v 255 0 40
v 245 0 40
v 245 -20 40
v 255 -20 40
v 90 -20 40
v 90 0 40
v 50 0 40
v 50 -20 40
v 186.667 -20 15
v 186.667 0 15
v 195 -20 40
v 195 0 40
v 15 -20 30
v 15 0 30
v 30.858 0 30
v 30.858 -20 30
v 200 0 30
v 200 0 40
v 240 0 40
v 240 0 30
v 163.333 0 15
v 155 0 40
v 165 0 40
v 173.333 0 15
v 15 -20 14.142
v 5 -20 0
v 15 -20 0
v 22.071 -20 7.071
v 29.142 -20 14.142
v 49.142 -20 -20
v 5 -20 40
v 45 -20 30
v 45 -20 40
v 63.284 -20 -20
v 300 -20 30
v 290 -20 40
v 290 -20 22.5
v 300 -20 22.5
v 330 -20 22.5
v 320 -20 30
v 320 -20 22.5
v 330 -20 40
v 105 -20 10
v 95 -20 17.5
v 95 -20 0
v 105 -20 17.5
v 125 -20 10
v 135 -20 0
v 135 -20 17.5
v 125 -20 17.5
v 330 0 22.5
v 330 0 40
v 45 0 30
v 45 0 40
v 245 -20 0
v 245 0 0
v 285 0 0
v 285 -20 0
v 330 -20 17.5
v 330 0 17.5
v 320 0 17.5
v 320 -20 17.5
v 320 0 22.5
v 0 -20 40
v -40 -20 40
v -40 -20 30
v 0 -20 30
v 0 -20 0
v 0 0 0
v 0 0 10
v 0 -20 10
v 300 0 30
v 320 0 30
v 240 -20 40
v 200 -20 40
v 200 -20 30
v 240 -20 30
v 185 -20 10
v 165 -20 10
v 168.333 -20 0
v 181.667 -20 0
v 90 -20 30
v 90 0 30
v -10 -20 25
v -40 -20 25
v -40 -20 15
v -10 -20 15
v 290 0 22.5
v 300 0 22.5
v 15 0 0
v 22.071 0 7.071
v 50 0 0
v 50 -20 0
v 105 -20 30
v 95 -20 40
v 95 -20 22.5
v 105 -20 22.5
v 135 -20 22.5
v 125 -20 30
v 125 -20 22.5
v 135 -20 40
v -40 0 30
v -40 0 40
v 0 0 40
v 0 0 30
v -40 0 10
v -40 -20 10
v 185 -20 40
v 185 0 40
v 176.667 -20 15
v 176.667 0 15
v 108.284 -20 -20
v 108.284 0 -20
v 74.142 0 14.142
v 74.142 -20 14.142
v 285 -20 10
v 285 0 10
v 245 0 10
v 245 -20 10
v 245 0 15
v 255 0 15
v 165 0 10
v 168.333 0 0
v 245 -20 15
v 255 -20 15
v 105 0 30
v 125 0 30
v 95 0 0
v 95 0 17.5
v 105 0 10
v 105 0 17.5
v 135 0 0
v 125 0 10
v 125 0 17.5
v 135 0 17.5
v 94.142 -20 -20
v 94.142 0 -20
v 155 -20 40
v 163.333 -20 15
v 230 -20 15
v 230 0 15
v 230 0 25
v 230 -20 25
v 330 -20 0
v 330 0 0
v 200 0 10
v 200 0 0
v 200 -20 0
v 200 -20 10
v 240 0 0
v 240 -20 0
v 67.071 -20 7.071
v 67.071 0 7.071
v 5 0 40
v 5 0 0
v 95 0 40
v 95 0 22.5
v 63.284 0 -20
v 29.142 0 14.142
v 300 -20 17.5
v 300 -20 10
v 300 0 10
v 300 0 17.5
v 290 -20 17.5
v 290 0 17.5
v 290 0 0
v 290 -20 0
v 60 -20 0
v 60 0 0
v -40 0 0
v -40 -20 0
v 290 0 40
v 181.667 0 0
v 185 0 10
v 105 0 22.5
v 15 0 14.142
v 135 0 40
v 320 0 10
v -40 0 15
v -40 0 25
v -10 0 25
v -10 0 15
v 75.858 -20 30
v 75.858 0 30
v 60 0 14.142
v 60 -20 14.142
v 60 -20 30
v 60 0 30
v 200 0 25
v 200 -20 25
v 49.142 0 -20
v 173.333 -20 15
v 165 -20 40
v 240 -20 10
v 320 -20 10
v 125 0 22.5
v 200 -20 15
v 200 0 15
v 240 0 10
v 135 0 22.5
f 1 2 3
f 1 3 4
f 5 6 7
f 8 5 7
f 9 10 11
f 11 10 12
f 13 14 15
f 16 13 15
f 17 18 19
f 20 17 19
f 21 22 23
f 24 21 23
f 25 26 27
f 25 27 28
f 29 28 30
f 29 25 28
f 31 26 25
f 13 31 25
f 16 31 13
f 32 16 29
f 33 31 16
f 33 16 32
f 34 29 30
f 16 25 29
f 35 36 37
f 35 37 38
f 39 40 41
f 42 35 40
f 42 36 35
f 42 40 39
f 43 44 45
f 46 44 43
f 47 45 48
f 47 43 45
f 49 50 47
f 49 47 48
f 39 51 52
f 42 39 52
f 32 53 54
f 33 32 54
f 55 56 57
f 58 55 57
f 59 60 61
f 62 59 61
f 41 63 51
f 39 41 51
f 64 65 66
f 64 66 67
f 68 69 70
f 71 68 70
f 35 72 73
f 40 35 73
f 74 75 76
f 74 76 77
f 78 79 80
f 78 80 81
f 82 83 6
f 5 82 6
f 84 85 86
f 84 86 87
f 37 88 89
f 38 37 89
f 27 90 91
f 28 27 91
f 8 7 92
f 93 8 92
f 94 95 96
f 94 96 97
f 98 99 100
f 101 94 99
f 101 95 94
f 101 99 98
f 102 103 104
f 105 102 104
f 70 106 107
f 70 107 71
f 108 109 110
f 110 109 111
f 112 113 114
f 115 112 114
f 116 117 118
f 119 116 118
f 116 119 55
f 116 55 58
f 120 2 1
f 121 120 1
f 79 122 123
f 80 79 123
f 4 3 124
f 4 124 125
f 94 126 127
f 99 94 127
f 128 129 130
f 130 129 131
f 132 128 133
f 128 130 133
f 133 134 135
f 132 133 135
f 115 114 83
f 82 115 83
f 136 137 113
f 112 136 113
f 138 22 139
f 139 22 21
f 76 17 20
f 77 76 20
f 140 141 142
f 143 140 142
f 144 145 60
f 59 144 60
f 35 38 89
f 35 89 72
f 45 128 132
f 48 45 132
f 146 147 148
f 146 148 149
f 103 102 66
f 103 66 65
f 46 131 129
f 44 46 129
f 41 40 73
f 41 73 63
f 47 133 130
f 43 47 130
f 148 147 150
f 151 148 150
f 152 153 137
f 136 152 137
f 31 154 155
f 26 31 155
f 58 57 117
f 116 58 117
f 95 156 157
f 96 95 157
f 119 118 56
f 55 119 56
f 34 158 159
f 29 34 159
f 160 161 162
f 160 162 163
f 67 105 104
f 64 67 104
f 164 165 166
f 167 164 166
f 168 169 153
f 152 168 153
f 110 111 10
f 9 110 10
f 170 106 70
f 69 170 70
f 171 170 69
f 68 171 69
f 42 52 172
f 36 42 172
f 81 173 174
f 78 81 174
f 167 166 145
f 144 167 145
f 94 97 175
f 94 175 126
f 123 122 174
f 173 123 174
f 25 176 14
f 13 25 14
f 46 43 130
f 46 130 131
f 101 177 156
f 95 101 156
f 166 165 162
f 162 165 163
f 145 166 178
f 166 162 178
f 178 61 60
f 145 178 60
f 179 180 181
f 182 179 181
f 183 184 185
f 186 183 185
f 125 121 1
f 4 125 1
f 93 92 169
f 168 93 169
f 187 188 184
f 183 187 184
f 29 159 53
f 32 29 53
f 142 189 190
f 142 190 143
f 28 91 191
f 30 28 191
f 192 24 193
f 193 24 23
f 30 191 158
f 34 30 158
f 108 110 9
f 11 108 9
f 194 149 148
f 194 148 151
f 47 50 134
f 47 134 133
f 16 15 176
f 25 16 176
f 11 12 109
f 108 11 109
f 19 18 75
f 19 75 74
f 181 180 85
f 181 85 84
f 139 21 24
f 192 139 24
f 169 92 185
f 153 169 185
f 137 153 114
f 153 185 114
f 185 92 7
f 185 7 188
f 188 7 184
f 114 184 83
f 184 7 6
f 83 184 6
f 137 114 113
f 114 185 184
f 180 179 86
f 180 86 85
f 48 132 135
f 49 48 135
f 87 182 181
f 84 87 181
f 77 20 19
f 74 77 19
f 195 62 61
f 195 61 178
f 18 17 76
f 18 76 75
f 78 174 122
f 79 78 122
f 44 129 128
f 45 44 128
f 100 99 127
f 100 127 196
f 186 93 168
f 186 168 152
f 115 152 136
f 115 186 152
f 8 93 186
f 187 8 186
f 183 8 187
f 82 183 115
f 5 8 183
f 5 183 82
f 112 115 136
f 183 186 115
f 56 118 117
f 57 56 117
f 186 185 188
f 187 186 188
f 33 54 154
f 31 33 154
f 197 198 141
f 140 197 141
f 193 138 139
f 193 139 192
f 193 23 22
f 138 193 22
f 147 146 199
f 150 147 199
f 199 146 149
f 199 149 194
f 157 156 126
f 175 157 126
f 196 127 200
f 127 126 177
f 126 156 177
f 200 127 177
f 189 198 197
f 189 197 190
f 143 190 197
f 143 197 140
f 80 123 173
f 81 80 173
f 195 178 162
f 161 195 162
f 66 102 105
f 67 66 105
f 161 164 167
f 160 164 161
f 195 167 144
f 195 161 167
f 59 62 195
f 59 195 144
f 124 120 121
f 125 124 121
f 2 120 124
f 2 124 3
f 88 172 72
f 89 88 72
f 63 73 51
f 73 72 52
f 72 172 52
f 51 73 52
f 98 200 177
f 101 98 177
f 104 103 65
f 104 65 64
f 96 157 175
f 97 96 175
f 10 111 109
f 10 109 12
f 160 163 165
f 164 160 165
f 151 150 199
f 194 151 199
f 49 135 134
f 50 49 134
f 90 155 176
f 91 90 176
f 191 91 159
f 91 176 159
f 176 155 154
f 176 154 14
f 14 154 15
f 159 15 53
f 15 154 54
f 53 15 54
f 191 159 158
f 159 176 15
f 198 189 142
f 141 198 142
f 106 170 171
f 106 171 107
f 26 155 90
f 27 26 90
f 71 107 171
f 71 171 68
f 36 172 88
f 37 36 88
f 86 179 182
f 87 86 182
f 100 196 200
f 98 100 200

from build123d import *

# Parameters (mm, degrees)
F0_W     = 40
F0_H     = 10
F0_W_2   = 30
F0_W_3   = 10
F0_H_2   = 25
F1_DEPTH = 20


with BuildPart() as f1:
    # F0 (on Front) → F1 (new body)
    with BuildSketch(Plane.XZ):
        with Locations((-20, 35)):
            Rectangle(F0_W, F0_H)
        with Locations((-25, 20)):
            Rectangle(F0_W_2, F0_H)
        with Locations((-20, 5)):
            Rectangle(F0_W, F0_H)
        Polygon((5, 40), (5, 0), (15, 0), (22.071068, 7.071068), (49.142136, -20), (63.284271, -20), (29.142136, 14.142136), (45, 30), (45, 40), align=None)
        Polygon((15, 14.142136), (15, 30), (30.857864, 30), align=None, mode=Mode.SUBTRACT)
        Polygon((50, 40), (50, 0), (60, 0), (67.071068, 7.071068), (94.142136, -20), (108.284271, -20), (74.142136, 14.142136), (90, 30), (90, 40), align=None)
        Polygon((60, 14.142136), (60, 30), (75.857864, 30), align=None, mode=Mode.SUBTRACT)
        Polygon((135, 40), (95, 40), (95, 22.5), (105, 22.5), (105, 30), (125, 30), (125, 22.5), (135, 22.5), align=None)
        Polygon((95, 17.5), (95, 0), (135, 0), (135, 17.5), (125, 17.5), (125, 10), (105, 10), (105, 17.5), align=None)
        Polygon((165, 40), (155, 40), (163.333333, 15), (173.333333, 15), align=None)
        with Locations((220, 35)):
            Rectangle(F0_W, F0_H)
        with Locations((215, 20)):
            Rectangle(F0_W_2, F0_H)
        with Locations((220, 5)):
            Rectangle(F0_W, F0_H)
        with Locations((250, 27.5)):
            Rectangle(F0_W_3, F0_H_2)
        Polygon((330, 40), (290, 40), (290, 22.5), (300, 22.5), (300, 30), (320, 30), (320, 22.5), (330, 22.5), align=None)
        Polygon((290, 17.5), (290, 0), (330, 0), (330, 17.5), (320, 17.5), (320, 10), (300, 10), (300, 17.5), align=None)
        Polygon((186.666667, 15), (195, 40), (185, 40), (176.666667, 15), align=None)
        Polygon((165, 10), (168.333333, 0), (181.666667, 0), (185, 10), align=None)
        Polygon((245, 10), (245, 0), (285, 0), (285, 10), (255, 10), align=None)
    extrude(amount=F1_DEPTH)


solid = f1.part
